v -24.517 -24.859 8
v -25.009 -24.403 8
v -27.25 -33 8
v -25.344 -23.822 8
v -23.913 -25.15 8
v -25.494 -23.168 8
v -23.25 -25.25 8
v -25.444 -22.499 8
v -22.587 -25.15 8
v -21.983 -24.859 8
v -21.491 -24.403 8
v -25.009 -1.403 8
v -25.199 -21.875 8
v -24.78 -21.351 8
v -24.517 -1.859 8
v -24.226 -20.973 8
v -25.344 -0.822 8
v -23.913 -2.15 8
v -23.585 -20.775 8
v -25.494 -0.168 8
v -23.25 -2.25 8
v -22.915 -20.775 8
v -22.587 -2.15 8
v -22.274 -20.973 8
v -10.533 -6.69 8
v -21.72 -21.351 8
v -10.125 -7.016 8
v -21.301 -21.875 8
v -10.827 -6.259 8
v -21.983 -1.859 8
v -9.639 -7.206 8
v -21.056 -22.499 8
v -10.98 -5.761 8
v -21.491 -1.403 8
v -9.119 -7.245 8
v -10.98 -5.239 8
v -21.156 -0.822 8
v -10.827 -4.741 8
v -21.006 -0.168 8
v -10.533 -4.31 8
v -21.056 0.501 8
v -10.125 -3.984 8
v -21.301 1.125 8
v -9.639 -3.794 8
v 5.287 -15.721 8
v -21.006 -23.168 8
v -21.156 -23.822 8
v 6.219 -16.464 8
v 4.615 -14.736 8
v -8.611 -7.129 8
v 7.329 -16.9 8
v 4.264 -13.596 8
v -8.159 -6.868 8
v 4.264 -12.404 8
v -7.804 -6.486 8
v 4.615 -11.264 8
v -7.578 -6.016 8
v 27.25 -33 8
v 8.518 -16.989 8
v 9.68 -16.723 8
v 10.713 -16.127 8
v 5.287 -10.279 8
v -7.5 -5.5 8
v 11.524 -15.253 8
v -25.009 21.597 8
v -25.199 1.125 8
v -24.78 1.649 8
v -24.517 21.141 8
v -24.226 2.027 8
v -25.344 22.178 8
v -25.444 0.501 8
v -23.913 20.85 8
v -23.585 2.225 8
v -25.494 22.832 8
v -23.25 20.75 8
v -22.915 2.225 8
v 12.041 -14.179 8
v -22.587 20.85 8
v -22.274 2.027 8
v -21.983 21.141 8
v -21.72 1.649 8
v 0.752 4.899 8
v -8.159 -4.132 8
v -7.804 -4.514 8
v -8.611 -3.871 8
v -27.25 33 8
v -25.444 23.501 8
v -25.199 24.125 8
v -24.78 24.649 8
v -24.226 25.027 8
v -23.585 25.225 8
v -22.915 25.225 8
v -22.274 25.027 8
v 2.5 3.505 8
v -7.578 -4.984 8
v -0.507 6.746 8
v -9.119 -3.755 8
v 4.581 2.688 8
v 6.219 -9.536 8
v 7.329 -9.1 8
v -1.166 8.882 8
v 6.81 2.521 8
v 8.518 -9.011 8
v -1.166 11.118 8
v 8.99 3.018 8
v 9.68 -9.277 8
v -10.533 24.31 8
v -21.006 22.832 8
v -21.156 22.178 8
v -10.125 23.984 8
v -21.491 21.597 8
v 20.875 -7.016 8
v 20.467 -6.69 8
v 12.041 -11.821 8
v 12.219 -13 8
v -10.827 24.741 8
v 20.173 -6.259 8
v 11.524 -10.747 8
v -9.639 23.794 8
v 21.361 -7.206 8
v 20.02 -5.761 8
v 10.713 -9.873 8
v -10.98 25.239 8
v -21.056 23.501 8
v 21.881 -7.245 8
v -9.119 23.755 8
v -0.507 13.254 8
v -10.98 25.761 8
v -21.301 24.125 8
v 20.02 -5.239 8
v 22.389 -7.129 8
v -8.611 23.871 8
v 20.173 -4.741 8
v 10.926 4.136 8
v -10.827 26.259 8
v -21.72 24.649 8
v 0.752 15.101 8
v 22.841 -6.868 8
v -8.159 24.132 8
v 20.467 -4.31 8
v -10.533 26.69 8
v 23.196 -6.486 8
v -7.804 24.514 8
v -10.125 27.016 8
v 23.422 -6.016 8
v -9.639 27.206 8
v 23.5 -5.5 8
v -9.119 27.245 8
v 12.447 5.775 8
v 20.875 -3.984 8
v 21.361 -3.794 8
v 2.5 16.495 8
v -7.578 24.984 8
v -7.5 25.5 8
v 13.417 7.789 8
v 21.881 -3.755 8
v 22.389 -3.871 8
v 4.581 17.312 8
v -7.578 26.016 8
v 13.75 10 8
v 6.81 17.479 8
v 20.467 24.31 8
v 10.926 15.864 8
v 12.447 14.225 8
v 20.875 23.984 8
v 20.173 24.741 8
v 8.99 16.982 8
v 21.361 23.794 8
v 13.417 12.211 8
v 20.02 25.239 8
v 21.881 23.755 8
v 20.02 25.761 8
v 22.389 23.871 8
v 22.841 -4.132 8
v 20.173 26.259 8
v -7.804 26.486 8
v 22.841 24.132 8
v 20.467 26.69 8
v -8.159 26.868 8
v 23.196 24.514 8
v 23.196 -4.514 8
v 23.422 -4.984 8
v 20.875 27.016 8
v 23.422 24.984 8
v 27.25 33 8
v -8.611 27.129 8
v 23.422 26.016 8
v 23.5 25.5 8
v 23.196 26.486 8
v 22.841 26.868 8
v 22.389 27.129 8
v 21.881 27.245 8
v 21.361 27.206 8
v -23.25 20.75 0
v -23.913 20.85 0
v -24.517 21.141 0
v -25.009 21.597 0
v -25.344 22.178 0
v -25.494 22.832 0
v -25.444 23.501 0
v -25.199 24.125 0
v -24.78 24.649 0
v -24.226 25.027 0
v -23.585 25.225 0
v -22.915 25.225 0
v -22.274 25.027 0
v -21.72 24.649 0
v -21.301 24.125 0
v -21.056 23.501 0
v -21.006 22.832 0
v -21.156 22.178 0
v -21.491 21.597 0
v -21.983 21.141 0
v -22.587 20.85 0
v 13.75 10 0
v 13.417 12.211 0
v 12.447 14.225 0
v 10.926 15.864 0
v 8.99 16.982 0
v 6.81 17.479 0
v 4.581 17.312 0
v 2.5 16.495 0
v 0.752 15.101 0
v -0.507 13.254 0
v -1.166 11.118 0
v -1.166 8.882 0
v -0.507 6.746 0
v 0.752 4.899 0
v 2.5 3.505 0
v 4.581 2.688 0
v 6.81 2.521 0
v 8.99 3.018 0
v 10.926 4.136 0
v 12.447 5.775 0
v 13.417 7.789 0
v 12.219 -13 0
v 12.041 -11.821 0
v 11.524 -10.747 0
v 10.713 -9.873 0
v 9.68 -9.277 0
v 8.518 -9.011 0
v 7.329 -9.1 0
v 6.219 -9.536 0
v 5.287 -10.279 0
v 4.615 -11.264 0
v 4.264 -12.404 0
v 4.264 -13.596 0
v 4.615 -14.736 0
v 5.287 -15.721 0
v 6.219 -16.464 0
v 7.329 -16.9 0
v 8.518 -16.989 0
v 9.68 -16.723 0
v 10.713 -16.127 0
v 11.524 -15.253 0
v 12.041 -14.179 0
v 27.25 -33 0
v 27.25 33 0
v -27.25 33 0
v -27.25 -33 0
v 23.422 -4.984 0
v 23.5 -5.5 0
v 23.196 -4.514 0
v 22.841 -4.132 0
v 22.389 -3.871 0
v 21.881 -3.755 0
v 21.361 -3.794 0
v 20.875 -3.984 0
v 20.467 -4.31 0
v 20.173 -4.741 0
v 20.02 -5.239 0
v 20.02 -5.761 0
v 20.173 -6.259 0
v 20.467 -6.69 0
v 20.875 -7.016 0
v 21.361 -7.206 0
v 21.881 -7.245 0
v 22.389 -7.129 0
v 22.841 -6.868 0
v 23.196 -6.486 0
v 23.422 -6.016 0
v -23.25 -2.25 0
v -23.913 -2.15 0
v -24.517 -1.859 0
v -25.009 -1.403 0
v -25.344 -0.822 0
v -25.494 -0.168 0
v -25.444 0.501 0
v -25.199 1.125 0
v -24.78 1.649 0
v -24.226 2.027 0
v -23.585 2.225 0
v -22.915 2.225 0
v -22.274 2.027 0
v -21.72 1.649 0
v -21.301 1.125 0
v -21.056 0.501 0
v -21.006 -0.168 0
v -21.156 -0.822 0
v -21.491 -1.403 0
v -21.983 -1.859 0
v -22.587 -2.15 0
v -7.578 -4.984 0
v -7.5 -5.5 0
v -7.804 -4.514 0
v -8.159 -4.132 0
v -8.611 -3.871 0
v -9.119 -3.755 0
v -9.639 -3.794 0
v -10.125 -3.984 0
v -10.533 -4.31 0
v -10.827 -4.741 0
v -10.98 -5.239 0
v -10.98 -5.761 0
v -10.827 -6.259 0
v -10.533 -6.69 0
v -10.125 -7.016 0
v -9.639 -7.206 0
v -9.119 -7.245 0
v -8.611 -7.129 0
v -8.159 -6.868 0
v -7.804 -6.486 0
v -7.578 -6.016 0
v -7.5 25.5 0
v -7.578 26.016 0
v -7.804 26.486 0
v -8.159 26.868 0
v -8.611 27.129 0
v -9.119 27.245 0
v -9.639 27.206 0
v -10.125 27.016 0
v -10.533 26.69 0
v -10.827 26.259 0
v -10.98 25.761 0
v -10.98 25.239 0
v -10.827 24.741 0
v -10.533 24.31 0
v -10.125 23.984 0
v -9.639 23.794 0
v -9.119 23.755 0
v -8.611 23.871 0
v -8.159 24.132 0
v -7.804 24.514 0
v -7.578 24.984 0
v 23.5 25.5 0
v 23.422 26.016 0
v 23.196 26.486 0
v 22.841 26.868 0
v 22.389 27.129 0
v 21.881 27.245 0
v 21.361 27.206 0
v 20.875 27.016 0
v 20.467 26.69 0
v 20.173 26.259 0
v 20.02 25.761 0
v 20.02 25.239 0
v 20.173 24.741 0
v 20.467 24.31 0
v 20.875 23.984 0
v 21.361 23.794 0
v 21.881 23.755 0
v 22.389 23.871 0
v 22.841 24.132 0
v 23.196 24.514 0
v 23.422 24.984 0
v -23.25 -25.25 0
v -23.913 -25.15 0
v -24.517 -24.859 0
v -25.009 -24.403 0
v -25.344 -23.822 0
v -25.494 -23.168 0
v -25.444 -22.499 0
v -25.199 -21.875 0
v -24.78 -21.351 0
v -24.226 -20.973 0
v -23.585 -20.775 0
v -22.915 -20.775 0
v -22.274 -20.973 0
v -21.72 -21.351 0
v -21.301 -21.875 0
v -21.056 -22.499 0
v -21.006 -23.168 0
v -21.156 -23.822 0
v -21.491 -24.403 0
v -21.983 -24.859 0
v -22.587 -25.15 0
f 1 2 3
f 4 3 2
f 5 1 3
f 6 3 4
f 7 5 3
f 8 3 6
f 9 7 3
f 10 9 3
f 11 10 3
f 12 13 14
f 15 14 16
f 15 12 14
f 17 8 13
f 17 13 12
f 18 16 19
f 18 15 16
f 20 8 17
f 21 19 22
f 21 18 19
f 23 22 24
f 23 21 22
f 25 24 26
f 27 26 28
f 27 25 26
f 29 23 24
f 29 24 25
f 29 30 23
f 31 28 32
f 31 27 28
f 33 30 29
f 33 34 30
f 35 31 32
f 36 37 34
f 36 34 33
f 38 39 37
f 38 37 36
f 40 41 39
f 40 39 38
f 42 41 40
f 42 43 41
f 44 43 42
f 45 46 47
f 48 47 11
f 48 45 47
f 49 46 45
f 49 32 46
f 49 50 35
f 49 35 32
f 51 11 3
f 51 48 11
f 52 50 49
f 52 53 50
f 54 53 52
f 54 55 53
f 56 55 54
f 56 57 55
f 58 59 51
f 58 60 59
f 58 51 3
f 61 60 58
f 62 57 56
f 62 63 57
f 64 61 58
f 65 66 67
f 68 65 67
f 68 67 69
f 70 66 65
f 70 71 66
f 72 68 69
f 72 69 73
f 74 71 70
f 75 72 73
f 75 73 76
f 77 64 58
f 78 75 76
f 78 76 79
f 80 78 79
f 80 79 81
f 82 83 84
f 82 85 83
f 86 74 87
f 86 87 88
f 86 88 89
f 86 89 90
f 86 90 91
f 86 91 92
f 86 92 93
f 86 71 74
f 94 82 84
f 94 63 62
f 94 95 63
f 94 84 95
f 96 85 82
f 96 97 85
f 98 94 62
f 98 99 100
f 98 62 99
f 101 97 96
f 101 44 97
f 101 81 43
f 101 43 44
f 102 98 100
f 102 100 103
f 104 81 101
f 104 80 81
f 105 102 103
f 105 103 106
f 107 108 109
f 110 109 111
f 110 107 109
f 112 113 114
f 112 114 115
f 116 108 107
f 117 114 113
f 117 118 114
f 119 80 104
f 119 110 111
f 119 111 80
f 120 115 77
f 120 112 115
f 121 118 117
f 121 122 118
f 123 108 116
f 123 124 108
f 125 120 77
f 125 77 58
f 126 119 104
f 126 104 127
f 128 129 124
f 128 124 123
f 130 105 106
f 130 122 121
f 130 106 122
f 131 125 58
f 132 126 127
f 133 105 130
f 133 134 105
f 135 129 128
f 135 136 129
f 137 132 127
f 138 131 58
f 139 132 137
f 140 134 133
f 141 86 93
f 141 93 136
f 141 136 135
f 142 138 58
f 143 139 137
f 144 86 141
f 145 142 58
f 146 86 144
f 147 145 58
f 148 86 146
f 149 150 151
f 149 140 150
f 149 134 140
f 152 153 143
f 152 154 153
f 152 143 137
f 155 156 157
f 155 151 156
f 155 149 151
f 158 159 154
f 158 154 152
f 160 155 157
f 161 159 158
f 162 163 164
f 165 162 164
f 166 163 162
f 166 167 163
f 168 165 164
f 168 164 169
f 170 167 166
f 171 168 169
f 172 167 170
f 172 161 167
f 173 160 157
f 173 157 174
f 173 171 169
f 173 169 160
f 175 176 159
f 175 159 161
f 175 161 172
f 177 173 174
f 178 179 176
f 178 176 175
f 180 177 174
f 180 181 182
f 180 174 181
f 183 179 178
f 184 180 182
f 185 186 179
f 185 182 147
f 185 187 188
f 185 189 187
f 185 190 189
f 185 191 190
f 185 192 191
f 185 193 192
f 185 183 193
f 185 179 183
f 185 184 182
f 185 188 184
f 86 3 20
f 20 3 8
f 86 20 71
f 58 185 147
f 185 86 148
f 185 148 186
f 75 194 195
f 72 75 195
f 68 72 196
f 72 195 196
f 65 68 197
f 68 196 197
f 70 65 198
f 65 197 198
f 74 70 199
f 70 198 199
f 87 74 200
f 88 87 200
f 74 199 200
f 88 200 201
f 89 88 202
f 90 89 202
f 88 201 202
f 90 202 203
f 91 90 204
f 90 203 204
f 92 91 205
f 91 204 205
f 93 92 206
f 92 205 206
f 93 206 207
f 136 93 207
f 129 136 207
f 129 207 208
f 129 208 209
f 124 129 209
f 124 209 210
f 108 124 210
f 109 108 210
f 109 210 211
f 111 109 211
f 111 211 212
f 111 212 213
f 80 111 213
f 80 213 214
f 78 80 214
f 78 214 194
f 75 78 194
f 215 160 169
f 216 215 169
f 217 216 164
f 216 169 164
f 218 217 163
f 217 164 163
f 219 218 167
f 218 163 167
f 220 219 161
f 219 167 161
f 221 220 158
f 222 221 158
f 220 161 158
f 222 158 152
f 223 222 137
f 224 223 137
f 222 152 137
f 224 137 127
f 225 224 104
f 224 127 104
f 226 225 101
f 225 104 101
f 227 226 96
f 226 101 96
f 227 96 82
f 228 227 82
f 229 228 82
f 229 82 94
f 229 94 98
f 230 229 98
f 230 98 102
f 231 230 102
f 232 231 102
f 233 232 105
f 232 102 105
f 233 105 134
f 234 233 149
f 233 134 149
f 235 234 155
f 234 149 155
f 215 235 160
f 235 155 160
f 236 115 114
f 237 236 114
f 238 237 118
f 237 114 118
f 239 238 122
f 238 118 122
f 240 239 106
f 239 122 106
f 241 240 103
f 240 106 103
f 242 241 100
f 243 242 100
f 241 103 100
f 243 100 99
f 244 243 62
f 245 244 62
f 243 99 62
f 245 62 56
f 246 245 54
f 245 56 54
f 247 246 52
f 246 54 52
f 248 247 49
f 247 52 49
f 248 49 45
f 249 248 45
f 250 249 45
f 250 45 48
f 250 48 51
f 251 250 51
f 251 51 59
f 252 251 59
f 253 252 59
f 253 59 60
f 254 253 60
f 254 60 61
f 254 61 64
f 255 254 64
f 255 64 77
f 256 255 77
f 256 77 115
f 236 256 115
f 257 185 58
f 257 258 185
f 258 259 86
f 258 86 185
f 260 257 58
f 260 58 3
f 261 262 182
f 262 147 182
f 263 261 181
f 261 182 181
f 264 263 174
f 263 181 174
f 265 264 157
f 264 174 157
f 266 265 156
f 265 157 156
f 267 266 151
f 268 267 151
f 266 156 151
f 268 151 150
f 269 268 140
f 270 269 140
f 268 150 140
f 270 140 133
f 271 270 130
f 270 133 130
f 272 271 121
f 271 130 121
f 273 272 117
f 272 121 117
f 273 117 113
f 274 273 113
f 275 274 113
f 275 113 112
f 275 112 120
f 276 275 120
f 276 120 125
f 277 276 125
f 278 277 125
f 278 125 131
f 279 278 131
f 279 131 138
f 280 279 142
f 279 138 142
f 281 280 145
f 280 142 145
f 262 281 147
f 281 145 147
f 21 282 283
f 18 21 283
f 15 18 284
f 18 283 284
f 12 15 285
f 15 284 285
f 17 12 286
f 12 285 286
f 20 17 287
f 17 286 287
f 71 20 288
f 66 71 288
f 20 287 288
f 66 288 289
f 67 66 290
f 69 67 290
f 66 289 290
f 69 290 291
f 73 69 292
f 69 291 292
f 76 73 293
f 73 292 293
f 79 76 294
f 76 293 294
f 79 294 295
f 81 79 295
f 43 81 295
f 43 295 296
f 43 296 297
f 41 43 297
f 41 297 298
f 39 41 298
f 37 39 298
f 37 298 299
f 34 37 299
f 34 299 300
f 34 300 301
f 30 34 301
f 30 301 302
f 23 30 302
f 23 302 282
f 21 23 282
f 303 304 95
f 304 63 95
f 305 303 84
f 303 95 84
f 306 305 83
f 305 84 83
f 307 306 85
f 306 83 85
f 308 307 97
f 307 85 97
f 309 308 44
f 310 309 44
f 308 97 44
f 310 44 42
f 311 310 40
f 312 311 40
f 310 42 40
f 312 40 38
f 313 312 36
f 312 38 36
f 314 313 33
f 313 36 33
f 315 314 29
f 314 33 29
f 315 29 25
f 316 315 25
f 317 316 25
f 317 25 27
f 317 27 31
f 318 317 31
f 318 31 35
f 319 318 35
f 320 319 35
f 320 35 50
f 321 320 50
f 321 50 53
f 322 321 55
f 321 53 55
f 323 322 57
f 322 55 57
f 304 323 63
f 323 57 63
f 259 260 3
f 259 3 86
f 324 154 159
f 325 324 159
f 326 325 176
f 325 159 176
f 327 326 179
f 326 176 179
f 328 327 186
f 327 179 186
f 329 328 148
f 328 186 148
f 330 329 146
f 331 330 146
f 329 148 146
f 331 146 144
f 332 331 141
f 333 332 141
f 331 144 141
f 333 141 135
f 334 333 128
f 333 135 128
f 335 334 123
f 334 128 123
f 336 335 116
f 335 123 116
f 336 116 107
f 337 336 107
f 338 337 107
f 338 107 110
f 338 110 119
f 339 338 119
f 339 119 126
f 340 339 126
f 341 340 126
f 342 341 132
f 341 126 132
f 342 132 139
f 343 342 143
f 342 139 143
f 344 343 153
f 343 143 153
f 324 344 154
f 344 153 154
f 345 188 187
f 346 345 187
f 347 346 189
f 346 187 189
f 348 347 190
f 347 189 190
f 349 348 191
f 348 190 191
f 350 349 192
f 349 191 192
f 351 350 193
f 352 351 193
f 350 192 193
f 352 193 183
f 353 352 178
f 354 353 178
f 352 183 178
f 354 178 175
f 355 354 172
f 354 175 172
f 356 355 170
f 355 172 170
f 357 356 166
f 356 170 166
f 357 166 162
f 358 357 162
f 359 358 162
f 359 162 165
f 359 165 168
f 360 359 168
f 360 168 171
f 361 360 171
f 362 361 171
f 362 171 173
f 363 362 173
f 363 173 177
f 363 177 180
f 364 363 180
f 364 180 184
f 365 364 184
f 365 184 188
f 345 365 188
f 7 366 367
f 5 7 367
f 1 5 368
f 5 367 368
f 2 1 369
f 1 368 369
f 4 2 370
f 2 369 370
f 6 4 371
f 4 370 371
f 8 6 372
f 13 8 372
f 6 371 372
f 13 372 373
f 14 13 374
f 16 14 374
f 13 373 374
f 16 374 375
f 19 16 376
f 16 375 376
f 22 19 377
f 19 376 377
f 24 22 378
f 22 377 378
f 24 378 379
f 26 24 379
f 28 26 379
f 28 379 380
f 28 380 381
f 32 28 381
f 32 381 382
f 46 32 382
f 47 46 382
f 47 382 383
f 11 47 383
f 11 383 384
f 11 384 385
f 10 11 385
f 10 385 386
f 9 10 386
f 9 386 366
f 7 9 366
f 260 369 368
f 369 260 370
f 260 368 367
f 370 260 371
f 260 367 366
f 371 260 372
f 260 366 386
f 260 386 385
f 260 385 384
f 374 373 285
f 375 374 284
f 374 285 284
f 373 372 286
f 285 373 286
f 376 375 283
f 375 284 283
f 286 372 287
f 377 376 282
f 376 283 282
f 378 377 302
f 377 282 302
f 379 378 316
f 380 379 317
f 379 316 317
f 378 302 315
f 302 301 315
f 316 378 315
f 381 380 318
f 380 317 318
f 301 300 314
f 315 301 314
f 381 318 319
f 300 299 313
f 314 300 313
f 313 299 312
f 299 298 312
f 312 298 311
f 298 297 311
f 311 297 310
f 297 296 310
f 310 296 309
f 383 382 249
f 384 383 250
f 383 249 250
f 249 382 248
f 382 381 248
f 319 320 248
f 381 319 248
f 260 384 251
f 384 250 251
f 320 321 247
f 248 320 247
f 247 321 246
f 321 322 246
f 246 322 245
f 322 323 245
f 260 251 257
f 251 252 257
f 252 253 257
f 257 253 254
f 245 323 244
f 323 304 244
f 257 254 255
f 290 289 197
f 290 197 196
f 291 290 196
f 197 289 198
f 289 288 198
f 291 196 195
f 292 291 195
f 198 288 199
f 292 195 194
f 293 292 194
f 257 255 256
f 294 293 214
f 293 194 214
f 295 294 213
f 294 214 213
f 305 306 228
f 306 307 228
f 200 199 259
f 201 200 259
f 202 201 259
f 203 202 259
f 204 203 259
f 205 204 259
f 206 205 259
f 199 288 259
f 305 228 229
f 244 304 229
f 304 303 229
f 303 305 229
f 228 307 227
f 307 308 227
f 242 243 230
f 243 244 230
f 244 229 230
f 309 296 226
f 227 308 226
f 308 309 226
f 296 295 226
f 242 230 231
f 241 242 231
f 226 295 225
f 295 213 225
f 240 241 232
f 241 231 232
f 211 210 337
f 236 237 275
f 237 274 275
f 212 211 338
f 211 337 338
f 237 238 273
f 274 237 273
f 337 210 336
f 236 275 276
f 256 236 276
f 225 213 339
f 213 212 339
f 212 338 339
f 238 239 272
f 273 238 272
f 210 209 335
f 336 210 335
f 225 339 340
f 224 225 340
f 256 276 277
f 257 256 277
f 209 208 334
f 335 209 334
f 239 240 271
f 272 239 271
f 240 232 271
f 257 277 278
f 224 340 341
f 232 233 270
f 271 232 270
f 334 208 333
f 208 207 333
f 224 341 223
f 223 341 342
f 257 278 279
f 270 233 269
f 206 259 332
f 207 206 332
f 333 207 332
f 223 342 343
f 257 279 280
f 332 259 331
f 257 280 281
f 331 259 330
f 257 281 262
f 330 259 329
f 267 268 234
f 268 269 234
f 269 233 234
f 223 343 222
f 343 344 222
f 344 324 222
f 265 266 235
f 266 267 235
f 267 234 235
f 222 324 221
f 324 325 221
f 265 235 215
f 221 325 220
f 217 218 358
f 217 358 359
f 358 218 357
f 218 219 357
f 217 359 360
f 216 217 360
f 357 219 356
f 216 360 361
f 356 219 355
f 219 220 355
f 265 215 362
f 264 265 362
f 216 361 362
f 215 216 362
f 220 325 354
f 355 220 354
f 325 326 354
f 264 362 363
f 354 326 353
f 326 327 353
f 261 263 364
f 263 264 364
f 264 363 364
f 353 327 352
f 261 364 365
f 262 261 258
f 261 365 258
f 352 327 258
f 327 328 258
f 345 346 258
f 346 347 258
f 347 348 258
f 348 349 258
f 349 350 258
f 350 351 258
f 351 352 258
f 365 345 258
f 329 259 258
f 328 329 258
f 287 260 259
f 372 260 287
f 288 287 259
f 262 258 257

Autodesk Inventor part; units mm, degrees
ref_plane "YZ Plane" through (0, 0, 0) normal (1, 0, 0) x (0, 1, 0)
ref_plane "XZ Plane" through (0, 0, 0) normal (0, 1, 0) x (-1, 0, 0)
ref_plane "XY Plane" through (0, 0, 0) normal (0, 0, 1) x (1, 0, 0)
sketch "Sketch1" plane through (0, 0, 0) normal (0, 0, 1) x (1, 0, 0)
  line L0 (-27.25, 33) -> (27.25, 33)
  line L1 (27.25, 33) -> (27.25, -33)
  line L2 (27.25, -33) -> (-27.25, -33)
  line L3 (-27.25, -33) -> (-27.25, 33)
  point P0 (0, 0)
  point P1 (0, 33)
  point P2 (-27.25, 0)
  dimension "d0" = 54.5
  dimension "d1" = 66
extrude "Extrusion1" add sketch "Sketch1" along normal blind 8
sketch "Sketch2" plane through (0, 0, 8) normal (0, 0, 1) x (1, 0, 0)
  circle A0 centre (6.25, 10) radius 7.5
  line L0 (27.25, 33) -> (-27.25, 33) projected
  line L1 (-27.25, 33) -> (-27.25, -33) projected
  line L2 (27.25, -33) -> (27.25, 33) projected
  line L3 (21.75, -5.5) -> (-9.25, -5.5) construction
  line L4 (-9.25, -5.5) -> (-9.25, 25.5) construction
  line L5 (-9.25, 25.5) -> (21.75, 25.5) construction
  line L6 (21.75, 25.5) -> (21.75, -5.5) construction
  line L7 (21.75, -5.5) -> (-9.25, 25.5) construction
  line L8 (-9.25, -5.5) -> (21.75, 25.5) construction
  circle A1 centre (-9.25, -5.5) radius 1.75
  circle A2 centre (-9.25, 25.5) radius 1.75
  circle A3 centre (21.75, 25.5) radius 1.75
  circle A4 centre (21.75, -5.5) radius 1.75
  point P0 (0, 33)
  point P1 (-27.25, 0)
  dimension "d17" = 15
  dimension "d19" = 21
  dimension "d20" = 23
  dimension "d22" = 31
  dimension "d23" = 3.5
extrude "Extrusion2" cut sketch "Sketch2" against normal through all
sketch "Sketch4" plane through (0, 0, 8) normal (0, 0, 1) x (1, 0, 0)
  circle A0 centre (8.2191, -13) radius 4
  line L0 (-27.25, -33) -> (27.25, -33) projected
  line L1 (27.25, -33) -> (27.25, 33) projected
  point P0 (0, 0)
  dimension "d24" = 8
  dimension "d25" = 20
  dimension "d26" = 19.0309
extrude "Extrusion4" cut sketch "Sketch4" against normal through all
sketch "Sketch5" plane through (0, 0, 8) normal (0, 0, 1) x (1, 0, 0)
  line L0 (-27.25, 33) -> (-27.25, -33) projected
  point P0 (0, 0)
  point P1 (-23.25, 0)
  point P2 (-23.25, -23)
  point P3 (-23.25, 23)
  dimension "d29" = 4
  dimension "d30" = 23
  dimension "d31" = 23
hole "Hole1" at (-23.25, 0, 8) at (-23.25, -23, 8) at (-23.25, 23, 8) direction (0, 0, -1) diameter 4.5 end through all
equation "\"d31\" = d30"
properties part number "0005-10-007Suport nema"
